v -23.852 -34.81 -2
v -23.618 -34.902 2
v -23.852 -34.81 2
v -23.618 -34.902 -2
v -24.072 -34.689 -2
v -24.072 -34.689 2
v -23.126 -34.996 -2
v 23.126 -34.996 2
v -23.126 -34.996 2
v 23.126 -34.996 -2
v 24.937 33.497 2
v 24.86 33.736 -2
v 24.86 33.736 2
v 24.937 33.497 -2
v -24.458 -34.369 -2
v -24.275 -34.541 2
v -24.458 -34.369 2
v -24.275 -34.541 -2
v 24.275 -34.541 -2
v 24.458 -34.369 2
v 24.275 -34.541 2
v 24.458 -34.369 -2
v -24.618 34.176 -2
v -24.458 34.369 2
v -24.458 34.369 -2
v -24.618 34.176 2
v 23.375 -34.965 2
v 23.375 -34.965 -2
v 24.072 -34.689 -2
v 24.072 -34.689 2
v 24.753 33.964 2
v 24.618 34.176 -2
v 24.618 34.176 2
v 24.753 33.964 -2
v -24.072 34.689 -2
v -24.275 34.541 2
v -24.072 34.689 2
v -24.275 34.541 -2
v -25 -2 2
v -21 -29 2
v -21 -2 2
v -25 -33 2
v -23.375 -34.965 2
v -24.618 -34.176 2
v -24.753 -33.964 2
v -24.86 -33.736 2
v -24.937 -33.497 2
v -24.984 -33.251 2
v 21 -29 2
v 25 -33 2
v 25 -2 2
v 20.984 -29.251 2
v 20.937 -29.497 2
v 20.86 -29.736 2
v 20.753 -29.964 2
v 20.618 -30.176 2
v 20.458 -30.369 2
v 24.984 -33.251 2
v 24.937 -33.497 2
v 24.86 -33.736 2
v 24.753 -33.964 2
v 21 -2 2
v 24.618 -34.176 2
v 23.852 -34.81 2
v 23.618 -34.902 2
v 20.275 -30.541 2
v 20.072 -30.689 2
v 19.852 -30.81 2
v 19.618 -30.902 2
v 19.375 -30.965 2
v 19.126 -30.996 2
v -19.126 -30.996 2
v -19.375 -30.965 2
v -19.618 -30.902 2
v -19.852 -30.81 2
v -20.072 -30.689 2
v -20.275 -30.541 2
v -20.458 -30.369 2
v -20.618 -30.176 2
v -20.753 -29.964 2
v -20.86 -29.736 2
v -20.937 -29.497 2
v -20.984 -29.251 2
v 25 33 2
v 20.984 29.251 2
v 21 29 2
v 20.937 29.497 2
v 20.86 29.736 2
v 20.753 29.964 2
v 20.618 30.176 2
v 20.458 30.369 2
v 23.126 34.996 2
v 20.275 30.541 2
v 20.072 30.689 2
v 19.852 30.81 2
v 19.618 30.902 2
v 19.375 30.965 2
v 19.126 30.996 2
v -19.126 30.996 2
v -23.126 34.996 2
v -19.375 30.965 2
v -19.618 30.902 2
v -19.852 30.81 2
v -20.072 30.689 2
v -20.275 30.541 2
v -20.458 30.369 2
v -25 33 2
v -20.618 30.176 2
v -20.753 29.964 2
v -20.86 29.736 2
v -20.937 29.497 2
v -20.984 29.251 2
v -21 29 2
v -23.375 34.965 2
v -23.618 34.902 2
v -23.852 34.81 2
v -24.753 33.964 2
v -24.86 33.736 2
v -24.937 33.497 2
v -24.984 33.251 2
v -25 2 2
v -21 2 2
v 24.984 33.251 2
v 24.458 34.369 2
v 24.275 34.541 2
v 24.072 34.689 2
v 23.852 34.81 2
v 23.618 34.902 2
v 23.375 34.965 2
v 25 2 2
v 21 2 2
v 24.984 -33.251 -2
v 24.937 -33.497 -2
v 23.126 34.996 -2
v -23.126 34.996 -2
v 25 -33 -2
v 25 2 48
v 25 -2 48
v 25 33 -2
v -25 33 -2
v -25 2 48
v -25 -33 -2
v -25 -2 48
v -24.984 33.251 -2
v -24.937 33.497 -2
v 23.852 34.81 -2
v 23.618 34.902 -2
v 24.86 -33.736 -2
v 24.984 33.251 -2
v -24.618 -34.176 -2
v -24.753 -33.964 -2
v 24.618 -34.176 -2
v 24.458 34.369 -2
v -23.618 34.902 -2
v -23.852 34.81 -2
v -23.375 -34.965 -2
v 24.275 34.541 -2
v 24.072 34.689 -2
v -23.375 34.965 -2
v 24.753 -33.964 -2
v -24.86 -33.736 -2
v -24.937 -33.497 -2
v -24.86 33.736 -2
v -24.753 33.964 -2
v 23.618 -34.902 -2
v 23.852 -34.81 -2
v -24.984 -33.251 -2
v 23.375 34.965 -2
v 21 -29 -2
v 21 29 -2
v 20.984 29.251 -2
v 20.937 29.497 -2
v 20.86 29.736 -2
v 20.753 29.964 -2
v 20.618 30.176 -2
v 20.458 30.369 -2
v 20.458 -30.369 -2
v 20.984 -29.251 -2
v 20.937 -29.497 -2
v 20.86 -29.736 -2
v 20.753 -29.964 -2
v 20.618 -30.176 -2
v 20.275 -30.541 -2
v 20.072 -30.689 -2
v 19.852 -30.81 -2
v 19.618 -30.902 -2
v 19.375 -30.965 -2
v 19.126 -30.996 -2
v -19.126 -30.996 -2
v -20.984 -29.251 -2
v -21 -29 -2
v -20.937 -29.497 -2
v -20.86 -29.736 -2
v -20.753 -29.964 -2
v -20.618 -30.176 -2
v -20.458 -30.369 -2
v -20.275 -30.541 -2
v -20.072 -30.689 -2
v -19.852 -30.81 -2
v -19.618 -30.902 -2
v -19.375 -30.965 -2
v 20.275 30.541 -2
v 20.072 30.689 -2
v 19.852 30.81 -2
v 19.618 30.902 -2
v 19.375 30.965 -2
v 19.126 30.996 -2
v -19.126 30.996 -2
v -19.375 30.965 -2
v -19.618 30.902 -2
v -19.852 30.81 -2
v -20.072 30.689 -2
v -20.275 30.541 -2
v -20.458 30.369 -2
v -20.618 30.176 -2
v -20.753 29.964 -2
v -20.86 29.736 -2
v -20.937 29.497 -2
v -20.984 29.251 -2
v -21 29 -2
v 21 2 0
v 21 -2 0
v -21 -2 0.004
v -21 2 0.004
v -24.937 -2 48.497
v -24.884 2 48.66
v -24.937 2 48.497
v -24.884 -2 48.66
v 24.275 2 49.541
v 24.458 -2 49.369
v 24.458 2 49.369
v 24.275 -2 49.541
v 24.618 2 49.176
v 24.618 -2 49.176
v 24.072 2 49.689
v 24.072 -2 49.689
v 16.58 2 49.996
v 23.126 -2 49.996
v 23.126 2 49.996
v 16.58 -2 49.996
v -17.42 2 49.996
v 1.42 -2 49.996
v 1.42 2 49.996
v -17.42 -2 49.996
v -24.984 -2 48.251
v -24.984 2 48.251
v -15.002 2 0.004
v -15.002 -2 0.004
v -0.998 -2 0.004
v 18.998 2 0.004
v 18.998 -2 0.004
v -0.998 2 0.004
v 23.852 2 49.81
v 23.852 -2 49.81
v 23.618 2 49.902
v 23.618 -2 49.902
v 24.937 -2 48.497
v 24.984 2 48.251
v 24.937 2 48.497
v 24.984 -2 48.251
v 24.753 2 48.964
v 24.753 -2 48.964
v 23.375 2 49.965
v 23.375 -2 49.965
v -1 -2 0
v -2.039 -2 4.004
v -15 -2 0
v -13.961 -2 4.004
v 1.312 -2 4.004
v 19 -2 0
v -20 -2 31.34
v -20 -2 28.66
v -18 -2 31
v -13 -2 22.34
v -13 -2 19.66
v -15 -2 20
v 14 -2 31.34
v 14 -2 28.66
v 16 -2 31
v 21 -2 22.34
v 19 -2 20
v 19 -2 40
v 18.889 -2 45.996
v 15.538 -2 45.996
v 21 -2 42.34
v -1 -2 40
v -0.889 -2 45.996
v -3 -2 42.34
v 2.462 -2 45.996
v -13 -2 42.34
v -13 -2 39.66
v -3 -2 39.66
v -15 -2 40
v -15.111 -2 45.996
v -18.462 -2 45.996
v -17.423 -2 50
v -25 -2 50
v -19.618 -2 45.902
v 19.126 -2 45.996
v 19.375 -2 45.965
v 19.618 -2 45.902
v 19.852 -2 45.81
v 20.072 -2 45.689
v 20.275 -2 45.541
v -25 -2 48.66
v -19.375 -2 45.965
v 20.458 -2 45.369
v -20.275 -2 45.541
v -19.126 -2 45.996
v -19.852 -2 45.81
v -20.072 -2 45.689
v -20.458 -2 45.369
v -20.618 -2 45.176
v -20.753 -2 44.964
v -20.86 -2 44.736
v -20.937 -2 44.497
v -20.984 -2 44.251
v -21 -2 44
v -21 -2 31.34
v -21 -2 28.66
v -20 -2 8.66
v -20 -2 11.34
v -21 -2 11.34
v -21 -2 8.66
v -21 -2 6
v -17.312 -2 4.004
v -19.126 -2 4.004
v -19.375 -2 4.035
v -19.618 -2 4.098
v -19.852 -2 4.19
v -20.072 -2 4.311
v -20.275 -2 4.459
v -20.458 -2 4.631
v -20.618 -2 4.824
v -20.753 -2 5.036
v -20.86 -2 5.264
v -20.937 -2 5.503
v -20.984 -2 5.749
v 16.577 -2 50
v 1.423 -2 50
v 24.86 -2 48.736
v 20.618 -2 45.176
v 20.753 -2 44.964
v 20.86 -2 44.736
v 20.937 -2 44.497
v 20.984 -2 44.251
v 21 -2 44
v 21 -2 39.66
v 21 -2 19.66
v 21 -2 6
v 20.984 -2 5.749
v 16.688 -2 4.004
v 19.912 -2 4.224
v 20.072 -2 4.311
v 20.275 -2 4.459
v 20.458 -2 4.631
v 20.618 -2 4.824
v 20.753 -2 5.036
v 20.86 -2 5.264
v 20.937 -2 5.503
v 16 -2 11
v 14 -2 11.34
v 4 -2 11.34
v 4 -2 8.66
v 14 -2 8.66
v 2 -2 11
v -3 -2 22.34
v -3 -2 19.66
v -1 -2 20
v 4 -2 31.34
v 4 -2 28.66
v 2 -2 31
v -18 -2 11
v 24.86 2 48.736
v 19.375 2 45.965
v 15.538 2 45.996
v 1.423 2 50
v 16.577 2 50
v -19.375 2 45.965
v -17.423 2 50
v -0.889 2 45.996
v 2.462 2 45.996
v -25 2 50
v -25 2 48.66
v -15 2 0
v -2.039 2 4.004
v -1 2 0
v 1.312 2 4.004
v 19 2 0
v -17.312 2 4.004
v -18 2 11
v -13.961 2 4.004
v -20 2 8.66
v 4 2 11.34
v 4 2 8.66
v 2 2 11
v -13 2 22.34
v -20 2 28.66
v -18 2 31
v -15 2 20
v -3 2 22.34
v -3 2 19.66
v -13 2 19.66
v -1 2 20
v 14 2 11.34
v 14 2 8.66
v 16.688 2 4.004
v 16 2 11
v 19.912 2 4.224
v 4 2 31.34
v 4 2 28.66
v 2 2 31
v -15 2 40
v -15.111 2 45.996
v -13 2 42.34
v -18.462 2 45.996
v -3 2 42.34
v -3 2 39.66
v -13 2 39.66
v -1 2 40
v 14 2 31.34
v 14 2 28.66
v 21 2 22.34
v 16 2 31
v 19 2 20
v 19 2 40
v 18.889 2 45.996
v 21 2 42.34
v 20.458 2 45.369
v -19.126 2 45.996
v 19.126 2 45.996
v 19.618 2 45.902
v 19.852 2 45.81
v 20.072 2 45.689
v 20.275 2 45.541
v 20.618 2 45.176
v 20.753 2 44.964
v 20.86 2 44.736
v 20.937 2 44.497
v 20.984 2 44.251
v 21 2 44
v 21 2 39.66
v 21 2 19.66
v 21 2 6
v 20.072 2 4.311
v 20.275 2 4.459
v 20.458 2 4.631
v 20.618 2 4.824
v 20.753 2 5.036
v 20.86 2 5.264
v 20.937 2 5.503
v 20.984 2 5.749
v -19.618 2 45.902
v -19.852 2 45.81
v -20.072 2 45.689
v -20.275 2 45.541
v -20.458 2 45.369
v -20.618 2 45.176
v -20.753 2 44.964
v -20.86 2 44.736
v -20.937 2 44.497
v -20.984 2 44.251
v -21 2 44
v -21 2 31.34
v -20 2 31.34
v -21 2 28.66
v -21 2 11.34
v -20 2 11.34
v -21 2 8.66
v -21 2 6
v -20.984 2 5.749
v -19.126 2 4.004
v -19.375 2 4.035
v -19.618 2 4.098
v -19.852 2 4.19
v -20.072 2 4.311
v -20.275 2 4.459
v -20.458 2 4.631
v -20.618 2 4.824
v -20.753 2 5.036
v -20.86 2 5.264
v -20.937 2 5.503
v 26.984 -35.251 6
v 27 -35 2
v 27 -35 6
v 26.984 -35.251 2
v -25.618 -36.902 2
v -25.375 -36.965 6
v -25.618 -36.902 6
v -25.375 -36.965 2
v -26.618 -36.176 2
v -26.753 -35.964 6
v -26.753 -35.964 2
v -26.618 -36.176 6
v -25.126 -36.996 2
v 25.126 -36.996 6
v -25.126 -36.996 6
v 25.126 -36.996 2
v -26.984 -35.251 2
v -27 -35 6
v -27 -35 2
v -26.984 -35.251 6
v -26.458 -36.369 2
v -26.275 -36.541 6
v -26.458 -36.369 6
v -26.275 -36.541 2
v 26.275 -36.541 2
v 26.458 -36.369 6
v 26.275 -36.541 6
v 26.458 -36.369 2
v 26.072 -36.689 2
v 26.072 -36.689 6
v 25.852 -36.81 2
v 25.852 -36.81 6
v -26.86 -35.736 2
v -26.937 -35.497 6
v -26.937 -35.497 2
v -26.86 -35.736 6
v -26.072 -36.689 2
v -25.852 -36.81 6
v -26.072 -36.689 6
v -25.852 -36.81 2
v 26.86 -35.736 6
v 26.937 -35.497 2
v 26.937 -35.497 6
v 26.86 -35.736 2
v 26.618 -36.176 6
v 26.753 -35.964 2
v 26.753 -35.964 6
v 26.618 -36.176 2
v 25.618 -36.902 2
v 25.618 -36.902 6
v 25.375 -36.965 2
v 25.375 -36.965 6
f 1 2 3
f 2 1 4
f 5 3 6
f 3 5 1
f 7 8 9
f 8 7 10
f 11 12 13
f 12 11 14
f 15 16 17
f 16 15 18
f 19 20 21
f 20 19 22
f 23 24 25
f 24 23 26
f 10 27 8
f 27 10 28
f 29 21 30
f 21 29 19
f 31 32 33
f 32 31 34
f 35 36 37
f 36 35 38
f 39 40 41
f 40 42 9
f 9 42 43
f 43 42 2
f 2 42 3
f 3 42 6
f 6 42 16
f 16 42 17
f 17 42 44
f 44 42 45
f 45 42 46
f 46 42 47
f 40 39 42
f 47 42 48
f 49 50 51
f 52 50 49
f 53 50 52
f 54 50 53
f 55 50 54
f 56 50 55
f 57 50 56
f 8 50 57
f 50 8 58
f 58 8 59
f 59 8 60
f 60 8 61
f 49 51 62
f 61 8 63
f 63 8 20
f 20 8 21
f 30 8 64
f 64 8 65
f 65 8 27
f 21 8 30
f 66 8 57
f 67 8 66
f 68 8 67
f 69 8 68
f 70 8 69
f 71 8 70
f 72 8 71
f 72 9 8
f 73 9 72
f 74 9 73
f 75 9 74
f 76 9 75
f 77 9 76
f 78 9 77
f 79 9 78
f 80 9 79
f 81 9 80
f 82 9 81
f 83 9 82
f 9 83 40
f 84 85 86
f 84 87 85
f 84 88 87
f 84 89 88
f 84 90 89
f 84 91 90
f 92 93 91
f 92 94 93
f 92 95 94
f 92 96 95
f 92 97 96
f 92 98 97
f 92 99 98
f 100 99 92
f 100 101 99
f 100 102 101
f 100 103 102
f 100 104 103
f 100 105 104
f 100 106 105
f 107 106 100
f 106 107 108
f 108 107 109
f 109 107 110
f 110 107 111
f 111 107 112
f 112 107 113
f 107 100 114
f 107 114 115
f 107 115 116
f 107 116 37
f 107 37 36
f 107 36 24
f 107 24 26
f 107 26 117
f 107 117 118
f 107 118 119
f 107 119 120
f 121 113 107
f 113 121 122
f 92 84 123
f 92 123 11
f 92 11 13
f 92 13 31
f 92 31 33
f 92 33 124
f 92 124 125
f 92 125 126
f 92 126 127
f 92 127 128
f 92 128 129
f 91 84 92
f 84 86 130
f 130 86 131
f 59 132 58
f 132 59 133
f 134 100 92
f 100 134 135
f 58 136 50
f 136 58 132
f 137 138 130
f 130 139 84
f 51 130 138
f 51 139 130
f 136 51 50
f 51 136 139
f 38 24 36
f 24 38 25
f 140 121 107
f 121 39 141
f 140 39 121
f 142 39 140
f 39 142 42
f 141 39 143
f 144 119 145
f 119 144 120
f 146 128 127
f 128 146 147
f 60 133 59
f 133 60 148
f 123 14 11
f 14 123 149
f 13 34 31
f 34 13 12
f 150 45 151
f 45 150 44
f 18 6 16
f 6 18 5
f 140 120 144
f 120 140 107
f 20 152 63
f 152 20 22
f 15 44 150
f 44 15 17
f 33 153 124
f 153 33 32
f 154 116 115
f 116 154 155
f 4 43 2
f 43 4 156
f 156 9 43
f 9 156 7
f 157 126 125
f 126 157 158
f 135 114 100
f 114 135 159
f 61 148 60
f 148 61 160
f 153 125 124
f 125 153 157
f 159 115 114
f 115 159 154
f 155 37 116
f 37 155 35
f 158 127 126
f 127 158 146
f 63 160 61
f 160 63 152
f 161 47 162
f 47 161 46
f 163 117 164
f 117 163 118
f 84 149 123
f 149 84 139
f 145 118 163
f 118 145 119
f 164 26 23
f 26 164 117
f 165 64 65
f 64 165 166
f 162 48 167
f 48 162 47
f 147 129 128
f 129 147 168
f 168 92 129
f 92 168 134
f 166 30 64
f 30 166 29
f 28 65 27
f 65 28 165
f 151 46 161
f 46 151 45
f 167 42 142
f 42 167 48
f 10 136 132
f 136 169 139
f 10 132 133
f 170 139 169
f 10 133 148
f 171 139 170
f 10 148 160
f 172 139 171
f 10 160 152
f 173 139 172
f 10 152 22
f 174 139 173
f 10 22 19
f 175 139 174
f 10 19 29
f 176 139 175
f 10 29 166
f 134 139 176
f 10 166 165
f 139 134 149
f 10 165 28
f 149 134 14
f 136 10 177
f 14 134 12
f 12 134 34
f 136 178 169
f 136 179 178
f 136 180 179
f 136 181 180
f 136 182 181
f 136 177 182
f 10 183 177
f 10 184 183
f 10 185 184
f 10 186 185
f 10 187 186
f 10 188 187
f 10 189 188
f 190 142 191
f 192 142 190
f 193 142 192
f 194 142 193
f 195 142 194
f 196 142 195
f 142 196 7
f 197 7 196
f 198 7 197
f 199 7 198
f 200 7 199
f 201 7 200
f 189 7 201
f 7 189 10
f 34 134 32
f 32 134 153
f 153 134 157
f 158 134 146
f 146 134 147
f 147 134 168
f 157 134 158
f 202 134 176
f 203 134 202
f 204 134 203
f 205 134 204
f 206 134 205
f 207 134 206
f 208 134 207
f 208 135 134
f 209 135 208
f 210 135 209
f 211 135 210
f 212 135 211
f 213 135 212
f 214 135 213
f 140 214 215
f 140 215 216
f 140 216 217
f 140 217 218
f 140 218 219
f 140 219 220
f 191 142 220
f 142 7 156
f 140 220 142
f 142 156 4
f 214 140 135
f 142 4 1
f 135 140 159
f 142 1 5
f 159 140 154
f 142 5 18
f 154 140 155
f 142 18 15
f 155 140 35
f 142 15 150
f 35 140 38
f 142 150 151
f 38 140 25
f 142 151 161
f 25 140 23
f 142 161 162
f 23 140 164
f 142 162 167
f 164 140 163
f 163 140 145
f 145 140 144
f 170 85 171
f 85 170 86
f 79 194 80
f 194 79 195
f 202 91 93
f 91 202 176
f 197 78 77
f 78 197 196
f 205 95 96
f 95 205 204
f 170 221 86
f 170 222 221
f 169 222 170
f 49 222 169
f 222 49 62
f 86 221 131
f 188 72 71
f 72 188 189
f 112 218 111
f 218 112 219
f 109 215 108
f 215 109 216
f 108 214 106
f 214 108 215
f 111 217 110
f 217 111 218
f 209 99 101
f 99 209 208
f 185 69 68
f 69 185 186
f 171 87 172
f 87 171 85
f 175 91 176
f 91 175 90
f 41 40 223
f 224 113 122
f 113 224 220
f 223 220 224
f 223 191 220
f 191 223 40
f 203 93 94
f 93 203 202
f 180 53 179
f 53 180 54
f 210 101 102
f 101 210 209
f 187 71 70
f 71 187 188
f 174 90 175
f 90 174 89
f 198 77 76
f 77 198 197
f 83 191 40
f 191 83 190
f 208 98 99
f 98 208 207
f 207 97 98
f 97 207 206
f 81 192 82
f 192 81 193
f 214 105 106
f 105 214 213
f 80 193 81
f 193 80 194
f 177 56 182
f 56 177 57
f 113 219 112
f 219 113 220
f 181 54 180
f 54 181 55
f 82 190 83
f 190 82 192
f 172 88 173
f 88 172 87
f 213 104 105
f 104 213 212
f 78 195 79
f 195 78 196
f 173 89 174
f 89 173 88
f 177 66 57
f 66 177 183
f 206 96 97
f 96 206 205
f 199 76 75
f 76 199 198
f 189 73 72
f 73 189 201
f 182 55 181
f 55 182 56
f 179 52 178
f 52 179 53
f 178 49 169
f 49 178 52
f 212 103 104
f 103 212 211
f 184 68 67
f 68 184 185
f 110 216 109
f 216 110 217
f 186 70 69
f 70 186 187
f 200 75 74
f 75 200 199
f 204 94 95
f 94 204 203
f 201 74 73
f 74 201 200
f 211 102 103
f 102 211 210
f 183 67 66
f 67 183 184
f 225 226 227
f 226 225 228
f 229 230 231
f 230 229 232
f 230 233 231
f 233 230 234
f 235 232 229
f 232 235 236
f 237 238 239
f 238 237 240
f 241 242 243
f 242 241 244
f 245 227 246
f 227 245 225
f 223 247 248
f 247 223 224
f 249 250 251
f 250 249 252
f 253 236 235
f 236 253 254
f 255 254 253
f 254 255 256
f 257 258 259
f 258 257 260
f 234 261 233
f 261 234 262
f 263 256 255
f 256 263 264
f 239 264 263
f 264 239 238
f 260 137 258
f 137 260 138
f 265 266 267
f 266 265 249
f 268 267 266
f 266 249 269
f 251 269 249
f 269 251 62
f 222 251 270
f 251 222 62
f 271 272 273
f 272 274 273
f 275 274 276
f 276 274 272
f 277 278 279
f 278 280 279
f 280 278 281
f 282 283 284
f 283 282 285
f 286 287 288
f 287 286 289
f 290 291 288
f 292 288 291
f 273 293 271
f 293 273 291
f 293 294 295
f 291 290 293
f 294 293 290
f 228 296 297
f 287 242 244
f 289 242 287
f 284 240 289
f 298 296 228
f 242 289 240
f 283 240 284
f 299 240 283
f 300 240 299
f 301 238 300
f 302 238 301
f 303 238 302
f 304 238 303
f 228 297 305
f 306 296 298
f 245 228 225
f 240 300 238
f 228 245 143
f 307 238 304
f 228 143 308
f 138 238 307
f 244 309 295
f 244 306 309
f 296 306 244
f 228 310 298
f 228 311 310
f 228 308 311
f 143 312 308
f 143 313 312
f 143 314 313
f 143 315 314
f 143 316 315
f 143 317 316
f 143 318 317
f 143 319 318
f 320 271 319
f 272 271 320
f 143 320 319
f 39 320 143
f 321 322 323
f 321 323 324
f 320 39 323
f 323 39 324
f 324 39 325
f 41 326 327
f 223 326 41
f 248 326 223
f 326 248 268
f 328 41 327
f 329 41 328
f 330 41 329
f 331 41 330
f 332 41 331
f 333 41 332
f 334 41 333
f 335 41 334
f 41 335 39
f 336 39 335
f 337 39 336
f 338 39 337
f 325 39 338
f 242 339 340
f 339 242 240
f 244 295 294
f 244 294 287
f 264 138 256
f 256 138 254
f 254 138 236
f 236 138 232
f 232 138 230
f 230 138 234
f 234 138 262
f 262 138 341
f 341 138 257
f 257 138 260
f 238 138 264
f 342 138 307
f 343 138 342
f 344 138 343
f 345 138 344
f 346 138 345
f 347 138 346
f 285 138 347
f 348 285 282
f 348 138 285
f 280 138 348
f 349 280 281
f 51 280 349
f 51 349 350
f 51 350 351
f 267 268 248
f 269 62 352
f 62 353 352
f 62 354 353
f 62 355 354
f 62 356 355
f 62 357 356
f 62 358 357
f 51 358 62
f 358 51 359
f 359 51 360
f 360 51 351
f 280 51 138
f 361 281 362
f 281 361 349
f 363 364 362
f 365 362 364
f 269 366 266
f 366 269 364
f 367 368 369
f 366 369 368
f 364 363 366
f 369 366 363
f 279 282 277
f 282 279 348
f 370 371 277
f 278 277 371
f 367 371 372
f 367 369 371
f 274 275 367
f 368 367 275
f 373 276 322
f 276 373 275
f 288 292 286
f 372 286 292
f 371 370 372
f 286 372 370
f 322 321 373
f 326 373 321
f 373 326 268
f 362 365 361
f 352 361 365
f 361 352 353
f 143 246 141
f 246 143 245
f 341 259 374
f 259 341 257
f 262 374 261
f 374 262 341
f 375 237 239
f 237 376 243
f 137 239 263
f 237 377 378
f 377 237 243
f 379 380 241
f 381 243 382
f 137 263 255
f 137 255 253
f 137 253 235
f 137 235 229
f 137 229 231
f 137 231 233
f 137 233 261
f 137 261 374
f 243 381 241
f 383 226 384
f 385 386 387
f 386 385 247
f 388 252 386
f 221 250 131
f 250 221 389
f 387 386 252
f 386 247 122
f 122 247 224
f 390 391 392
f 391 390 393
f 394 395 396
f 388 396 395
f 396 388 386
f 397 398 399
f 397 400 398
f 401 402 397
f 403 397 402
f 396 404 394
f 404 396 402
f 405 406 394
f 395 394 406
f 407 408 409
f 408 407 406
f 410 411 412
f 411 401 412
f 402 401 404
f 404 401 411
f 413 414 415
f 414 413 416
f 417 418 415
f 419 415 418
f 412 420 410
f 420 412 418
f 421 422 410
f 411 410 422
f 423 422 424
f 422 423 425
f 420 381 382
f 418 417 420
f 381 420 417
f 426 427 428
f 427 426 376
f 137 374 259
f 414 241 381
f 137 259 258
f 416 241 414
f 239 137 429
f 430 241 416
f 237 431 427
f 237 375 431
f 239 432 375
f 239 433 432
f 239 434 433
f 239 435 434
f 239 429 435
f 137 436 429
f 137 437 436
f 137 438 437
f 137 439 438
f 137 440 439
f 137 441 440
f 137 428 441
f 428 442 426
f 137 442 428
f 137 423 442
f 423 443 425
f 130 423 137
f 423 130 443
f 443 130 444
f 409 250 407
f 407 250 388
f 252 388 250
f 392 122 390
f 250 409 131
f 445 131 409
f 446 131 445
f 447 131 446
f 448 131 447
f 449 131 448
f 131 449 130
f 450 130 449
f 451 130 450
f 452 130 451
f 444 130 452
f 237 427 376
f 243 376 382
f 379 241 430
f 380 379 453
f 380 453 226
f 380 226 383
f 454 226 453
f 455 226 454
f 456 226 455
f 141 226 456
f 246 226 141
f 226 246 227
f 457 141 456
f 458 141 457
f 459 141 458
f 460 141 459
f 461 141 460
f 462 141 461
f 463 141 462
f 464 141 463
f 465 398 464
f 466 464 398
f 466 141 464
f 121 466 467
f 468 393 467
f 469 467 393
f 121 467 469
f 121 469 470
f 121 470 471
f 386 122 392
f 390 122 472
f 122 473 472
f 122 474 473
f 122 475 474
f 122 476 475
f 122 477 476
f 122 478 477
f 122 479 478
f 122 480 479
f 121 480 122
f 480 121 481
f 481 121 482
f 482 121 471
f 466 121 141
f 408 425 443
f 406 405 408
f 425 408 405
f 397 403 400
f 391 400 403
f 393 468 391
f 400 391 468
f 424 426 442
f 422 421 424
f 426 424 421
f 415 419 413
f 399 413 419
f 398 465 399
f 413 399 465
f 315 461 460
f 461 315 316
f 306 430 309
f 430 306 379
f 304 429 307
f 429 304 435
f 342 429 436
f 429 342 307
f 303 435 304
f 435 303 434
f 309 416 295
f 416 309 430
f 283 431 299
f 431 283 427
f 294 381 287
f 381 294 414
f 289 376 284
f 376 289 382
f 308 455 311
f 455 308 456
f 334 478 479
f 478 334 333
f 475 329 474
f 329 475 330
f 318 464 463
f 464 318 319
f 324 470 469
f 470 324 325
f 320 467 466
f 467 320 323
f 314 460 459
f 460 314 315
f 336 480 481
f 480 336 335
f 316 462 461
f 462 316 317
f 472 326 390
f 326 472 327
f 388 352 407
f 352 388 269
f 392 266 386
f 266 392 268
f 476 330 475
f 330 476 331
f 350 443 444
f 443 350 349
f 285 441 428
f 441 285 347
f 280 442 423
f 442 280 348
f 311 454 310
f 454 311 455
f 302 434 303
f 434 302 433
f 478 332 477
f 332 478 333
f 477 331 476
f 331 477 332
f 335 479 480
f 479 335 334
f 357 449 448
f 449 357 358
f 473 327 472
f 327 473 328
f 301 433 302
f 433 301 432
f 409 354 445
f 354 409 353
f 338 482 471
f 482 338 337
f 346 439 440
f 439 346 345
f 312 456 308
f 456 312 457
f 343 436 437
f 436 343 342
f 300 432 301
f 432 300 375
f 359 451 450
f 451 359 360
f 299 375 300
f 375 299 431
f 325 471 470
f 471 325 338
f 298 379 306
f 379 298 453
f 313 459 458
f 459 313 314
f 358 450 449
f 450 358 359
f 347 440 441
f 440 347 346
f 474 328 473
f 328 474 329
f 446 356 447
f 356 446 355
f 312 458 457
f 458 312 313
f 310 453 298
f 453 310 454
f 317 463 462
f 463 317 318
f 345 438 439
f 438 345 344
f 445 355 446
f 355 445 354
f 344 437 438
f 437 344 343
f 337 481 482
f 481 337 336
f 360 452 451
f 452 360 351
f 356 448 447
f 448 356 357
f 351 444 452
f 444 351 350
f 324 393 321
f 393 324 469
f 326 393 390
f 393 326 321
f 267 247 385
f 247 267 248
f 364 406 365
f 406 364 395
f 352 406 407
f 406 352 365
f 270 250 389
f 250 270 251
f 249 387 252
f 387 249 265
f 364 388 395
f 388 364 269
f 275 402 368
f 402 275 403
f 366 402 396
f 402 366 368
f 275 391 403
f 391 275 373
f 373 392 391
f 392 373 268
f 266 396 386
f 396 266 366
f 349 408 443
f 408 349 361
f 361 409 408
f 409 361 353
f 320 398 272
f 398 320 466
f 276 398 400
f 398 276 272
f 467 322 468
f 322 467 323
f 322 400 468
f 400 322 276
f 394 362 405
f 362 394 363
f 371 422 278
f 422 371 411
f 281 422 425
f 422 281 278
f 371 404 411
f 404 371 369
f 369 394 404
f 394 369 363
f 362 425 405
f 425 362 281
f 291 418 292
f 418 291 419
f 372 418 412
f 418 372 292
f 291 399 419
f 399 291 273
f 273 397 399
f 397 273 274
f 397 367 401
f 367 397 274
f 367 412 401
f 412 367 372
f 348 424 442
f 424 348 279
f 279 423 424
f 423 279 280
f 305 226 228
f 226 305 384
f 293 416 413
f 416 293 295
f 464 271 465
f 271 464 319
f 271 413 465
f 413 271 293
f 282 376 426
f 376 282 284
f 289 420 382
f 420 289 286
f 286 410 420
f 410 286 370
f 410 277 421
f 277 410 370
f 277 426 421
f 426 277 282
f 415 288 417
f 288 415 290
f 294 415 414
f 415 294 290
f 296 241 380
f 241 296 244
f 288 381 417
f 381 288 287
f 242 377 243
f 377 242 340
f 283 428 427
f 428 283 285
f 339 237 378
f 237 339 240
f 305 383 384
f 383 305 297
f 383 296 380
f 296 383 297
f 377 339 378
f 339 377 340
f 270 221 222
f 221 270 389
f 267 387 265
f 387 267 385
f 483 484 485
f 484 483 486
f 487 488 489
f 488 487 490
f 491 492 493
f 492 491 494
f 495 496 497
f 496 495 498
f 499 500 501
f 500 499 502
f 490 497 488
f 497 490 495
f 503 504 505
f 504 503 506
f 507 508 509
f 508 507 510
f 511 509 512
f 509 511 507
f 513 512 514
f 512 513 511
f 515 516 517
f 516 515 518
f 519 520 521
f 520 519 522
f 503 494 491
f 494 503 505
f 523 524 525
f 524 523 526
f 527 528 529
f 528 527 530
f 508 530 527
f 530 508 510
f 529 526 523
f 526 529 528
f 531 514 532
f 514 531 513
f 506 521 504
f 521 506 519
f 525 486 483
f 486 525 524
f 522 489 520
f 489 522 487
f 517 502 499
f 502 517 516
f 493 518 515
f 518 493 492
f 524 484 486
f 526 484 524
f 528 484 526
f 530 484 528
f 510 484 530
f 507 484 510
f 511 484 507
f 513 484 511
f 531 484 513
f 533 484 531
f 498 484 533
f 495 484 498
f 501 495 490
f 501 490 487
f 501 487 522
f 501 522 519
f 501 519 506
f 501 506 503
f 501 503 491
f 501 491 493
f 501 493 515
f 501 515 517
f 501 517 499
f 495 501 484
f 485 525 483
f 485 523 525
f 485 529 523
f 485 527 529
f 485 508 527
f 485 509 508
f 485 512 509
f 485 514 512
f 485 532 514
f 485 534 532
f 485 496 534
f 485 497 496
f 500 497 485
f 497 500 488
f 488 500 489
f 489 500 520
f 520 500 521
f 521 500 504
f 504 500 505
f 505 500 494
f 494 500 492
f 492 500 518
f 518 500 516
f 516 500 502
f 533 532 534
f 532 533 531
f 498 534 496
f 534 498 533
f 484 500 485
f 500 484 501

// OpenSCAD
// file: utils.scad
// Cube with rounded corners
// roundedCornerCube (50,50,4);
module roundedCornerCube(length, width, thickness){

        hull()
        {
            translate([length/2 - 2, width/2 - 2, 0]) cylinder(r=2, h=thickness, $fn=50, center=true);
            translate([length/2 - 2, -width/2 + 2, 0]) cylinder(r=2, h=thickness, $fn=50, center=true);
            translate([-length/2 + 2, width/2 - 2, 0]) cylinder(r=2, h=thickness, $fn=50, center=true);
            translate([-length/2 + 2, -width/2 + 2, 0]) cylinder(r=2, h=thickness, $fn=50, center=true);
        }

}

// Hollow cube with rounded corners. Will look like a frame with rounded con
// hollowRoundedCornerCube(50,70,4,2);
module hollowRoundedCornerCube(length, width, thickness, wallthickness)
{
    difference()
    {
        roundedCornerCube(length,width,thickness);
        roundedCornerCube(length-(wallthickness*2),width-(wallthickness*2),thickness);
    }
}

/*
module cylinderWithHandle(radius, thickness)
{
    rotate_extrude($fn=100)
        polygon( points = [[0,0], [radius,0], [radius,thickness] , [1,thickness], [2,thickness + 2] , [2,thickness + 6],[0,thickness + 6]] );
}
*/


// hollow cylinder
// hollowCylinder(radius, height, wallThickness)
// radius : radius to outter wall
// wallThickness : Thickness of wall
module hollowCylinder(radius, height, wallThickness)
{

    difference()
    {
        cylinder(h=height, r1=radius, r2=radius);
        translate([0,0,-.02]) cylinder(h=height + .04, r1=radius - wallThickness, r2=radius - wallThickness);
    }
}


// hollow cylinders
// hollowCylinders(20, 10, 2, 2, 2)
// radius : radius to outer wall
// gapsSize : size of gap between each rings
// minradius : radius of the smallest ring
module hollowCylinders(radius, height, wallThickness, gapSize, minRadius)
{
    for (i = [radius : -(gapSize + wallThickness) : minRadius])
    {
       //echo (i);
       hollowCylinder(i,height,wallThickness);
    }
}

//
// b = bottom diameter
// t = top diameter
// h = height
module cone(b, t, h)
{
    cylinder(h=h, r1=b/2, r2=t/2, $fn=100);
}

// hollowCone(10,4,20, 2)
module hollowCone(bottomRadius, topRadius, height, wallThickness)
{
    difference()
    {
        cylinder(h=height, r1=bottomRadius, r2=topRadius, $fn=100);
        translate([0,0,-.02]) cylinder(h=height, r1=bottomRadius - wallThickness, r2=topRadius - wallThickness, $fn=100);
    }
}


// w = width between flat surface
// h = height
module hex (w=10, h=2){
  cylinder (r=w/2, h=h, center=true, $fn=6);
}

// hollowCone(10,4,20, 2)
module hollowHex(w=10, h=2, th=2)
{
    difference()
    {
        cylinder (r=w/2, h=h, center=true, $fn=6);
        cylinder (r=w/2 - th, h=h, center=true, $fn=6);
    }
}

// h : height
// ns : number of sides for base
// br : bottom radius
// tr : top radius
// ro : rotation in degree between bottom and top
// sl : slice layer. high value give smooth appearence
module twistExtrude(h=50,ns=6,br=20,tr=20,ro=100,sl=5)
{

	linear_extrude(height = h, twist  = ro,	slices = sl, scale  = tr/br)
		circle(r=br, $fn=ns);
}


// h : height
// ns : number of sides for base
// br : bottom radius
// tr : top radius
// ro : rotation in degree between bottom and top
// sl : slice layer. high value give smooth appearence
// wt : wall thickness
module hollowTwistExtrude(h=50,ns=6,br=20,tr=20,ro=100,sl=5,wt=1)
{
	difference()
	{
		linear_extrude(height = h, twist  = ro,	slices = sl, scale  = tr/br)
			circle(r=br, $fn=ns);

    translate([0,0,-.01])
		linear_extrude(height = h + .1, twist  = ro,	slices = sl, scale  = tr/br)
			circle(r=br - wt, $fn=ns);
	}
}


///////////////////////////////////////////////////////////////////////////////////////////////////////////////////

// honeycomb tiles
// honeycombSquare(100,100,4,10,2);
module honeycombTiles(length, width,thickness,rad,wallThickness)
{
    //thickness = 4;
    //rad = 10;
    //wallThickness = 2;
    //length = 100;
    //width = 100;

    for (w=[0: width/rad])
    {

        if (w % 2 == 0)
        {
            //cylinder($fn=6, r=rad, h=2);
            for (i = [0 : length/((rad*2) + (wallThickness*2))])
            {
              translate([rad*(3*i) + (wallThickness*2)*i,w*rad,0]) cylinder($fn=6, r=rad, h=thickness);

              //translate([rad*6 + (wallThickness*2)*2,0,0]) cylinder($fn=6, r=10, h=2);
              //translate([rad*9 + (wallThickness*2)*3,0,0]) cylinder($fn=6, r=10, h=2);
            }
        }

        if (w % 2 == 1)
        {
            for (j = [1 : 2 : (length/(rad + wallThickness))])
            {
              translate([(rad*1.5) *j + wallThickness *j , (w*rad) + wallThickness/2 ,0])  cylinder($fn=6, r=rad, h=thickness);
                //translate([(rad*1.5) *3 + wallThickness *3 ,10,0]) circle($fn=6, r=10);
                //translate([(rad*1.5) *5 + wallThickness *5 ,10,0]) circle($fn=6, r=10);
            }
        }
    }
}

// honeycomb square
// A square area with hollow honeycomb design
// honeycombSquare(100,100,4,10,2);
module honeycombSquare(length, width, thickness, cellRad,wallThickness)
{
    difference()
    {
        cube([length,width,thickness], center=true);
        translate([-length/2,-width/2, -thickness/2]) honeycombTiles(length,width,thickness,cellRad,wallThickness);
    }
}

//honeycomb(length, width, height, cell_size, wall_thickness);
//honeycomb(50, 50, 4, 10, 1);
//hollowRoundedCornerCube(50,70,4,2);

//hollowCylinder(10,20,2);

//hollowCylinders(20, 10, 2, 2, 2);
//cone(10,2,20);

// hollowCone(10,4,20, 2);

// honeycombSquare(40,40,2,5,2);


module edgeClamp(l=10)
{
   difference()
   {
    translate([0,.6,0]) rotate([45,0,0]) cube([l,2,2], center=true);
    translate([0,.6,1.5]) cube([l + .1,1,1], center=true);
    translate([0,.6,-1.5]) cube([l + .1,1,1], center=true);
   }
   cube([l,2,2], center=true);
}

cube([10,2,2], center=true);
translate([0,0,2]) edgeClamp();
// main file
// Simple phone stand

use <utils.scad> 

l = 50;
w = 70; // width of the base (l x w = area of the base)
h = 50; // Height of the back support 
th = 4; // thickness
eb = true; // extend base to back to prevent tip over. Not required if phone is placed only on the side (watch videos etc.) on the stand

// base of the stand
module base()
{
    hollowRoundedCornerCube(l,w,th,th);
}

// vertical back of the stand
module backside()
{

    translate([0,0,h/2])
        rotate ([90,0,0])
            hollowRoundedCornerCube(l,h,th,th);
    
    translate([0,0,h/2])
        rotate ([90,0,0])
            honeycombSquare(l, h, th, 10,2);

}  


//end stop
module endstop()
{
    difference()
    {
        hull()
        {
            translate([l/2,-w/2,th]) cylinder(r=2, h=4, $fn=50, center=true);
            translate([-l/2,-w/2,th]) cylinder(r=2, h=4, $fn=50, center=true);
        }
        
        translate([0,-w/2 + 1,th]) cube([l+th,th/2,th], center=true);
    }
}


/*
module roundedCornerCube(length, width, thickness){

       hull()
        {
            translate([length/2, width/2, 0]) cylinder(r=2, h=thickness, $fn=50, center=true);
            translate([length/2, -width/2, 0]) cylinder(r=2, h=thickness, $fn=50, center=true);
            translate([-length/2, width/2, 0]) cylinder(r=2, h=thickness, $fn=50, center=true);
            translate([-length/2, -width/2, 0]) cylinder(r=2, h=thickness, $fn=50, center=true);
        }

}
*/

base();
backside();
endstop();
